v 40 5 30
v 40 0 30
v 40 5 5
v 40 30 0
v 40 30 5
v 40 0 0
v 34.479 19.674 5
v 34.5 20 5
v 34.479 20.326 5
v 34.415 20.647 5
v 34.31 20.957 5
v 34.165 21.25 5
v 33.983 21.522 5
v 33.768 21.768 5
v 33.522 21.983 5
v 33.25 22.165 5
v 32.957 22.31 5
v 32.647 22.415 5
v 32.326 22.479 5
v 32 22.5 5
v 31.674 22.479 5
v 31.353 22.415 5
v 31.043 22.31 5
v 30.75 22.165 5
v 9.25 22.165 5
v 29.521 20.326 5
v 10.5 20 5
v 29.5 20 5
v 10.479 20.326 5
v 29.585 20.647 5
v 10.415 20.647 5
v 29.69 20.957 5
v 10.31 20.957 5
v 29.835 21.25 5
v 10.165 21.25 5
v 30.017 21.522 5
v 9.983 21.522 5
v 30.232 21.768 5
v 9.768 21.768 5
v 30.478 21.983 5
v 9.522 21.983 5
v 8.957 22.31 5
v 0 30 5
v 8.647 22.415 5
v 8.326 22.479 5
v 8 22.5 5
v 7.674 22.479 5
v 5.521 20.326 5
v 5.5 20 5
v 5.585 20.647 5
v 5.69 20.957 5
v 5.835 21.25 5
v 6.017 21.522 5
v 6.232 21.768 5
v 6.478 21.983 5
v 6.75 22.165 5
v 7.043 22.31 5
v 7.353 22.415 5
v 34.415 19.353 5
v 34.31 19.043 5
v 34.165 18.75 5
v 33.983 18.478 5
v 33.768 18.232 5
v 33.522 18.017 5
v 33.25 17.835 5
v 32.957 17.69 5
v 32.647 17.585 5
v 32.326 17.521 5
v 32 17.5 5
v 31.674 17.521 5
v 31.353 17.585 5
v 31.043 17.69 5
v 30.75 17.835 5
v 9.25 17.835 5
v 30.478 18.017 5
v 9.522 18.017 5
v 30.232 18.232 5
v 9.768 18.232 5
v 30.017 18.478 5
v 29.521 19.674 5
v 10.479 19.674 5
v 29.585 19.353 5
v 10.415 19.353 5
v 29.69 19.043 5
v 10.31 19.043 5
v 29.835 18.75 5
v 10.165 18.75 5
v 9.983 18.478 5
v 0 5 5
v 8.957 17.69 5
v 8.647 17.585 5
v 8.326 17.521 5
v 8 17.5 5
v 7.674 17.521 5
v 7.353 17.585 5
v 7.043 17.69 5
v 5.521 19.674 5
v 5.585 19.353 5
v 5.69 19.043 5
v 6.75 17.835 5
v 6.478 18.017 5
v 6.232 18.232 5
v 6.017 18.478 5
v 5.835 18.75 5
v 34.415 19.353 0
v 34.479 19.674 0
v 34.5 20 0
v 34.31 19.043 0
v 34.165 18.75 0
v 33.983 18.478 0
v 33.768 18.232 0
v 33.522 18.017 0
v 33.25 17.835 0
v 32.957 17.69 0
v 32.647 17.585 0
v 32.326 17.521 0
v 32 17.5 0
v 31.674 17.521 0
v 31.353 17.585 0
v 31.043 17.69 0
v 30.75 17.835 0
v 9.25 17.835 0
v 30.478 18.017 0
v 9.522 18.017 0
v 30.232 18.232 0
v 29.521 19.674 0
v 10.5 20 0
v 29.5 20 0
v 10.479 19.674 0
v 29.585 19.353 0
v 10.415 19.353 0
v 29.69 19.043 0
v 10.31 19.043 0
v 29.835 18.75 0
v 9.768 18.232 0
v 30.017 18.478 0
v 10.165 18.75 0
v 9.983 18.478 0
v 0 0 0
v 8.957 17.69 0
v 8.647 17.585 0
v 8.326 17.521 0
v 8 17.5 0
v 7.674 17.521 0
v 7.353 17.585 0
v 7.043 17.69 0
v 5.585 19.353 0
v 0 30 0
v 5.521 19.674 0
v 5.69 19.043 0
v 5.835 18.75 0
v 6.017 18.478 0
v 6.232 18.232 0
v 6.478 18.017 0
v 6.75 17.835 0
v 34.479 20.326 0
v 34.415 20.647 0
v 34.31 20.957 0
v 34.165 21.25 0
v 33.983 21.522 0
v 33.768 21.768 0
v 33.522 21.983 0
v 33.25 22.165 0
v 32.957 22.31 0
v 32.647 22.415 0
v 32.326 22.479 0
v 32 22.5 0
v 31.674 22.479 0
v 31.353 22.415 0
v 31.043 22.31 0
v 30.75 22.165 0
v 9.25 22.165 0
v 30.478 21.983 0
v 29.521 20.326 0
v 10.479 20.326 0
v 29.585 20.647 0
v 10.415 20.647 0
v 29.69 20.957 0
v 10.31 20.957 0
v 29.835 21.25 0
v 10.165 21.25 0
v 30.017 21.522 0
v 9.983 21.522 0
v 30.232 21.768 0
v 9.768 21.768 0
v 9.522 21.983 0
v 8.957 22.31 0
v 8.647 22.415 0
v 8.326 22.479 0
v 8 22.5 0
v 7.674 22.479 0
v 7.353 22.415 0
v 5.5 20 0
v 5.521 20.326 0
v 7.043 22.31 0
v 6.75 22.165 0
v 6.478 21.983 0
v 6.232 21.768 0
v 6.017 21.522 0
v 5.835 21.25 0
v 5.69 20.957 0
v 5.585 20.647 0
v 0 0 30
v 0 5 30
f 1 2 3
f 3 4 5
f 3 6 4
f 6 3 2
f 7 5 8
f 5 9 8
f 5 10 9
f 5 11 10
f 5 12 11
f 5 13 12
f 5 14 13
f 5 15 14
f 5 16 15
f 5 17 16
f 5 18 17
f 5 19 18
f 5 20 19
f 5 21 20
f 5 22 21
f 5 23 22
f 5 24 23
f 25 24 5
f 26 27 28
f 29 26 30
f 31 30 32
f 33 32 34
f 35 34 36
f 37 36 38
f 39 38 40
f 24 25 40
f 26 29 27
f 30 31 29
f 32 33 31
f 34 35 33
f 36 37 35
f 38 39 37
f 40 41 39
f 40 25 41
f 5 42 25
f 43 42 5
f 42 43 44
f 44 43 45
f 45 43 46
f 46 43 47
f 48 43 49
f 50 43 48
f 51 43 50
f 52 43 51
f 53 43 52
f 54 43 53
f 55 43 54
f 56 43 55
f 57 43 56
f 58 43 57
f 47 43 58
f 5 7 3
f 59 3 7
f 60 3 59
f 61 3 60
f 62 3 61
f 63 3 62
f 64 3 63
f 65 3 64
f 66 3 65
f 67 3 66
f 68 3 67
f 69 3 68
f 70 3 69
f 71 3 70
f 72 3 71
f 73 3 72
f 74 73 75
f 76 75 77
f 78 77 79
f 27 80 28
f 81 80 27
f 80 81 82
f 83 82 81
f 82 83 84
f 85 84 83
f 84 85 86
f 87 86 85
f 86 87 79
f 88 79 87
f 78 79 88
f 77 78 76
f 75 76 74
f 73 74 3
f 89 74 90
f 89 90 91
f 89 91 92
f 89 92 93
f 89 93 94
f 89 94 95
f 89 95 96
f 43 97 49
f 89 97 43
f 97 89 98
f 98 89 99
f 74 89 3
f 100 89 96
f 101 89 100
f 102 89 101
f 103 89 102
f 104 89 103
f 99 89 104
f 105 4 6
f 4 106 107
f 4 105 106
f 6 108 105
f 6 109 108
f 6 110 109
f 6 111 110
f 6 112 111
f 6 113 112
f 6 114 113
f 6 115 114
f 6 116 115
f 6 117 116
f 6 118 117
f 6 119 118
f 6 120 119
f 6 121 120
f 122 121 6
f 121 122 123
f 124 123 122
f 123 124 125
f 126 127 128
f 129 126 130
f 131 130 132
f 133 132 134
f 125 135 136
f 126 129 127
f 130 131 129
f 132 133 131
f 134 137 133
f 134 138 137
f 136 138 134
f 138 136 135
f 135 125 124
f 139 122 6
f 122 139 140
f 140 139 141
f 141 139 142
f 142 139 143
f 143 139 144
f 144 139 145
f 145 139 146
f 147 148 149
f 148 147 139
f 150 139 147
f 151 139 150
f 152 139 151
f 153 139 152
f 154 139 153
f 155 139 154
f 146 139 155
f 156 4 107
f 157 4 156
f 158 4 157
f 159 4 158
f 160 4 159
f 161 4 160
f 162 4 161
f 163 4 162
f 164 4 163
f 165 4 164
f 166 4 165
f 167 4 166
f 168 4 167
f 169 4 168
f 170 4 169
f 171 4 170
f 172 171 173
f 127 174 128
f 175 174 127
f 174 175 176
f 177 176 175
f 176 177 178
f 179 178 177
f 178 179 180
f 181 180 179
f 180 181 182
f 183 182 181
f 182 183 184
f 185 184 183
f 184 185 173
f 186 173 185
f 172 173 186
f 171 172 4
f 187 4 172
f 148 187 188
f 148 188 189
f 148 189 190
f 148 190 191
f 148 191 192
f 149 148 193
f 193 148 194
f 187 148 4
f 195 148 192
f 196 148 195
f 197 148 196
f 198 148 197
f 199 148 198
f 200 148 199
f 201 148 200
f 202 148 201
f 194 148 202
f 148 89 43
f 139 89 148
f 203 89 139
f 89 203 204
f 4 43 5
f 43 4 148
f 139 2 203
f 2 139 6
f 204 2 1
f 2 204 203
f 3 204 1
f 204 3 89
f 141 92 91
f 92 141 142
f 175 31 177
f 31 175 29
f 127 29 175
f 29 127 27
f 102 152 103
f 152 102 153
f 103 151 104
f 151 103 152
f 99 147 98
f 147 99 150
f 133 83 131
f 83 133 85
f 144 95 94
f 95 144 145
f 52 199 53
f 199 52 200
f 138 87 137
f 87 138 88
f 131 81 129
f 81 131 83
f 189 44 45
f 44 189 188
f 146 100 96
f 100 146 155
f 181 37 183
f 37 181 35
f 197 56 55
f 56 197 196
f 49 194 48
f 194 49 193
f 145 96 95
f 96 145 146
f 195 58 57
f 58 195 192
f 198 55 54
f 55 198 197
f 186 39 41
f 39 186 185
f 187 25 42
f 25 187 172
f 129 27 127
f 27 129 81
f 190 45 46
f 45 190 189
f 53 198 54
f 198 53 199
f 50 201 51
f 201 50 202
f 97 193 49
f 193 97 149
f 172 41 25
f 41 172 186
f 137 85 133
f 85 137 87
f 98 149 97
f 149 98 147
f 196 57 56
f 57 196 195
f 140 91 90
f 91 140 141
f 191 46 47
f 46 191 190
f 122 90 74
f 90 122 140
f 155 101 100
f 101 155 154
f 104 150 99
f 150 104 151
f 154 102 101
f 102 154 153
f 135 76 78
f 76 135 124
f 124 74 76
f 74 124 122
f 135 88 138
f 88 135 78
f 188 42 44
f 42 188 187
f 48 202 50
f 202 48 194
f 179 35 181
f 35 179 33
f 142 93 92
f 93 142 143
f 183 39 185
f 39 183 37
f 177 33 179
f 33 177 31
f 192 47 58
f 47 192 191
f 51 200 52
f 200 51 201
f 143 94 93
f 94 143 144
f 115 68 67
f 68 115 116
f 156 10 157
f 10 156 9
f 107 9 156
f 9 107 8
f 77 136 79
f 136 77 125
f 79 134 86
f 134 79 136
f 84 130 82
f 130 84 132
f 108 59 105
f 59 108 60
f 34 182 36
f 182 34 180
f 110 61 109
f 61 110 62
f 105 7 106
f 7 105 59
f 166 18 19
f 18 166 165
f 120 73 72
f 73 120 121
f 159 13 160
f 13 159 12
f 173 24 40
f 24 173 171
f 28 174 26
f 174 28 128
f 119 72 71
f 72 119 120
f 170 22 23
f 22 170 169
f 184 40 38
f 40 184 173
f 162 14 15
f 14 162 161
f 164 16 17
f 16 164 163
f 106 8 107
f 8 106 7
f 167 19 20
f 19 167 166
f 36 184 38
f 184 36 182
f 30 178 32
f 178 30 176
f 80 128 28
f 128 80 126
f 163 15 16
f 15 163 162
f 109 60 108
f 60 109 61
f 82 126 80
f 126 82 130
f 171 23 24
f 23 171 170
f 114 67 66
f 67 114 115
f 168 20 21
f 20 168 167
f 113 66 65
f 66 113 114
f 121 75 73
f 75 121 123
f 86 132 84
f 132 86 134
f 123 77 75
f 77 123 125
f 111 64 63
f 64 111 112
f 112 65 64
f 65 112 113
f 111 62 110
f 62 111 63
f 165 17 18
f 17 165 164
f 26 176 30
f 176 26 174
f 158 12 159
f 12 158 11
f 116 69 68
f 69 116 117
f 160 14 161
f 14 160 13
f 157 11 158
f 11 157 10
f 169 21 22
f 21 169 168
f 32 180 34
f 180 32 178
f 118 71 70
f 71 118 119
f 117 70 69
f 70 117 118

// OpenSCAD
// L-bracket. Assumption: upright at the Y=0 edge; base spans Y 0..30.
// Holes at Y = 15 + 5 = 20 (away from upright), X = 20 +/- 12.
$fn = 48;
difference() {
    union() {
        cube([40, 30, 5]);   // base
        cube([40, 5, 30]);   // upright
    }
    for (x = [8, 32])
        translate([x, 20, -1]) cylinder(d = 5, h = 7);
}
